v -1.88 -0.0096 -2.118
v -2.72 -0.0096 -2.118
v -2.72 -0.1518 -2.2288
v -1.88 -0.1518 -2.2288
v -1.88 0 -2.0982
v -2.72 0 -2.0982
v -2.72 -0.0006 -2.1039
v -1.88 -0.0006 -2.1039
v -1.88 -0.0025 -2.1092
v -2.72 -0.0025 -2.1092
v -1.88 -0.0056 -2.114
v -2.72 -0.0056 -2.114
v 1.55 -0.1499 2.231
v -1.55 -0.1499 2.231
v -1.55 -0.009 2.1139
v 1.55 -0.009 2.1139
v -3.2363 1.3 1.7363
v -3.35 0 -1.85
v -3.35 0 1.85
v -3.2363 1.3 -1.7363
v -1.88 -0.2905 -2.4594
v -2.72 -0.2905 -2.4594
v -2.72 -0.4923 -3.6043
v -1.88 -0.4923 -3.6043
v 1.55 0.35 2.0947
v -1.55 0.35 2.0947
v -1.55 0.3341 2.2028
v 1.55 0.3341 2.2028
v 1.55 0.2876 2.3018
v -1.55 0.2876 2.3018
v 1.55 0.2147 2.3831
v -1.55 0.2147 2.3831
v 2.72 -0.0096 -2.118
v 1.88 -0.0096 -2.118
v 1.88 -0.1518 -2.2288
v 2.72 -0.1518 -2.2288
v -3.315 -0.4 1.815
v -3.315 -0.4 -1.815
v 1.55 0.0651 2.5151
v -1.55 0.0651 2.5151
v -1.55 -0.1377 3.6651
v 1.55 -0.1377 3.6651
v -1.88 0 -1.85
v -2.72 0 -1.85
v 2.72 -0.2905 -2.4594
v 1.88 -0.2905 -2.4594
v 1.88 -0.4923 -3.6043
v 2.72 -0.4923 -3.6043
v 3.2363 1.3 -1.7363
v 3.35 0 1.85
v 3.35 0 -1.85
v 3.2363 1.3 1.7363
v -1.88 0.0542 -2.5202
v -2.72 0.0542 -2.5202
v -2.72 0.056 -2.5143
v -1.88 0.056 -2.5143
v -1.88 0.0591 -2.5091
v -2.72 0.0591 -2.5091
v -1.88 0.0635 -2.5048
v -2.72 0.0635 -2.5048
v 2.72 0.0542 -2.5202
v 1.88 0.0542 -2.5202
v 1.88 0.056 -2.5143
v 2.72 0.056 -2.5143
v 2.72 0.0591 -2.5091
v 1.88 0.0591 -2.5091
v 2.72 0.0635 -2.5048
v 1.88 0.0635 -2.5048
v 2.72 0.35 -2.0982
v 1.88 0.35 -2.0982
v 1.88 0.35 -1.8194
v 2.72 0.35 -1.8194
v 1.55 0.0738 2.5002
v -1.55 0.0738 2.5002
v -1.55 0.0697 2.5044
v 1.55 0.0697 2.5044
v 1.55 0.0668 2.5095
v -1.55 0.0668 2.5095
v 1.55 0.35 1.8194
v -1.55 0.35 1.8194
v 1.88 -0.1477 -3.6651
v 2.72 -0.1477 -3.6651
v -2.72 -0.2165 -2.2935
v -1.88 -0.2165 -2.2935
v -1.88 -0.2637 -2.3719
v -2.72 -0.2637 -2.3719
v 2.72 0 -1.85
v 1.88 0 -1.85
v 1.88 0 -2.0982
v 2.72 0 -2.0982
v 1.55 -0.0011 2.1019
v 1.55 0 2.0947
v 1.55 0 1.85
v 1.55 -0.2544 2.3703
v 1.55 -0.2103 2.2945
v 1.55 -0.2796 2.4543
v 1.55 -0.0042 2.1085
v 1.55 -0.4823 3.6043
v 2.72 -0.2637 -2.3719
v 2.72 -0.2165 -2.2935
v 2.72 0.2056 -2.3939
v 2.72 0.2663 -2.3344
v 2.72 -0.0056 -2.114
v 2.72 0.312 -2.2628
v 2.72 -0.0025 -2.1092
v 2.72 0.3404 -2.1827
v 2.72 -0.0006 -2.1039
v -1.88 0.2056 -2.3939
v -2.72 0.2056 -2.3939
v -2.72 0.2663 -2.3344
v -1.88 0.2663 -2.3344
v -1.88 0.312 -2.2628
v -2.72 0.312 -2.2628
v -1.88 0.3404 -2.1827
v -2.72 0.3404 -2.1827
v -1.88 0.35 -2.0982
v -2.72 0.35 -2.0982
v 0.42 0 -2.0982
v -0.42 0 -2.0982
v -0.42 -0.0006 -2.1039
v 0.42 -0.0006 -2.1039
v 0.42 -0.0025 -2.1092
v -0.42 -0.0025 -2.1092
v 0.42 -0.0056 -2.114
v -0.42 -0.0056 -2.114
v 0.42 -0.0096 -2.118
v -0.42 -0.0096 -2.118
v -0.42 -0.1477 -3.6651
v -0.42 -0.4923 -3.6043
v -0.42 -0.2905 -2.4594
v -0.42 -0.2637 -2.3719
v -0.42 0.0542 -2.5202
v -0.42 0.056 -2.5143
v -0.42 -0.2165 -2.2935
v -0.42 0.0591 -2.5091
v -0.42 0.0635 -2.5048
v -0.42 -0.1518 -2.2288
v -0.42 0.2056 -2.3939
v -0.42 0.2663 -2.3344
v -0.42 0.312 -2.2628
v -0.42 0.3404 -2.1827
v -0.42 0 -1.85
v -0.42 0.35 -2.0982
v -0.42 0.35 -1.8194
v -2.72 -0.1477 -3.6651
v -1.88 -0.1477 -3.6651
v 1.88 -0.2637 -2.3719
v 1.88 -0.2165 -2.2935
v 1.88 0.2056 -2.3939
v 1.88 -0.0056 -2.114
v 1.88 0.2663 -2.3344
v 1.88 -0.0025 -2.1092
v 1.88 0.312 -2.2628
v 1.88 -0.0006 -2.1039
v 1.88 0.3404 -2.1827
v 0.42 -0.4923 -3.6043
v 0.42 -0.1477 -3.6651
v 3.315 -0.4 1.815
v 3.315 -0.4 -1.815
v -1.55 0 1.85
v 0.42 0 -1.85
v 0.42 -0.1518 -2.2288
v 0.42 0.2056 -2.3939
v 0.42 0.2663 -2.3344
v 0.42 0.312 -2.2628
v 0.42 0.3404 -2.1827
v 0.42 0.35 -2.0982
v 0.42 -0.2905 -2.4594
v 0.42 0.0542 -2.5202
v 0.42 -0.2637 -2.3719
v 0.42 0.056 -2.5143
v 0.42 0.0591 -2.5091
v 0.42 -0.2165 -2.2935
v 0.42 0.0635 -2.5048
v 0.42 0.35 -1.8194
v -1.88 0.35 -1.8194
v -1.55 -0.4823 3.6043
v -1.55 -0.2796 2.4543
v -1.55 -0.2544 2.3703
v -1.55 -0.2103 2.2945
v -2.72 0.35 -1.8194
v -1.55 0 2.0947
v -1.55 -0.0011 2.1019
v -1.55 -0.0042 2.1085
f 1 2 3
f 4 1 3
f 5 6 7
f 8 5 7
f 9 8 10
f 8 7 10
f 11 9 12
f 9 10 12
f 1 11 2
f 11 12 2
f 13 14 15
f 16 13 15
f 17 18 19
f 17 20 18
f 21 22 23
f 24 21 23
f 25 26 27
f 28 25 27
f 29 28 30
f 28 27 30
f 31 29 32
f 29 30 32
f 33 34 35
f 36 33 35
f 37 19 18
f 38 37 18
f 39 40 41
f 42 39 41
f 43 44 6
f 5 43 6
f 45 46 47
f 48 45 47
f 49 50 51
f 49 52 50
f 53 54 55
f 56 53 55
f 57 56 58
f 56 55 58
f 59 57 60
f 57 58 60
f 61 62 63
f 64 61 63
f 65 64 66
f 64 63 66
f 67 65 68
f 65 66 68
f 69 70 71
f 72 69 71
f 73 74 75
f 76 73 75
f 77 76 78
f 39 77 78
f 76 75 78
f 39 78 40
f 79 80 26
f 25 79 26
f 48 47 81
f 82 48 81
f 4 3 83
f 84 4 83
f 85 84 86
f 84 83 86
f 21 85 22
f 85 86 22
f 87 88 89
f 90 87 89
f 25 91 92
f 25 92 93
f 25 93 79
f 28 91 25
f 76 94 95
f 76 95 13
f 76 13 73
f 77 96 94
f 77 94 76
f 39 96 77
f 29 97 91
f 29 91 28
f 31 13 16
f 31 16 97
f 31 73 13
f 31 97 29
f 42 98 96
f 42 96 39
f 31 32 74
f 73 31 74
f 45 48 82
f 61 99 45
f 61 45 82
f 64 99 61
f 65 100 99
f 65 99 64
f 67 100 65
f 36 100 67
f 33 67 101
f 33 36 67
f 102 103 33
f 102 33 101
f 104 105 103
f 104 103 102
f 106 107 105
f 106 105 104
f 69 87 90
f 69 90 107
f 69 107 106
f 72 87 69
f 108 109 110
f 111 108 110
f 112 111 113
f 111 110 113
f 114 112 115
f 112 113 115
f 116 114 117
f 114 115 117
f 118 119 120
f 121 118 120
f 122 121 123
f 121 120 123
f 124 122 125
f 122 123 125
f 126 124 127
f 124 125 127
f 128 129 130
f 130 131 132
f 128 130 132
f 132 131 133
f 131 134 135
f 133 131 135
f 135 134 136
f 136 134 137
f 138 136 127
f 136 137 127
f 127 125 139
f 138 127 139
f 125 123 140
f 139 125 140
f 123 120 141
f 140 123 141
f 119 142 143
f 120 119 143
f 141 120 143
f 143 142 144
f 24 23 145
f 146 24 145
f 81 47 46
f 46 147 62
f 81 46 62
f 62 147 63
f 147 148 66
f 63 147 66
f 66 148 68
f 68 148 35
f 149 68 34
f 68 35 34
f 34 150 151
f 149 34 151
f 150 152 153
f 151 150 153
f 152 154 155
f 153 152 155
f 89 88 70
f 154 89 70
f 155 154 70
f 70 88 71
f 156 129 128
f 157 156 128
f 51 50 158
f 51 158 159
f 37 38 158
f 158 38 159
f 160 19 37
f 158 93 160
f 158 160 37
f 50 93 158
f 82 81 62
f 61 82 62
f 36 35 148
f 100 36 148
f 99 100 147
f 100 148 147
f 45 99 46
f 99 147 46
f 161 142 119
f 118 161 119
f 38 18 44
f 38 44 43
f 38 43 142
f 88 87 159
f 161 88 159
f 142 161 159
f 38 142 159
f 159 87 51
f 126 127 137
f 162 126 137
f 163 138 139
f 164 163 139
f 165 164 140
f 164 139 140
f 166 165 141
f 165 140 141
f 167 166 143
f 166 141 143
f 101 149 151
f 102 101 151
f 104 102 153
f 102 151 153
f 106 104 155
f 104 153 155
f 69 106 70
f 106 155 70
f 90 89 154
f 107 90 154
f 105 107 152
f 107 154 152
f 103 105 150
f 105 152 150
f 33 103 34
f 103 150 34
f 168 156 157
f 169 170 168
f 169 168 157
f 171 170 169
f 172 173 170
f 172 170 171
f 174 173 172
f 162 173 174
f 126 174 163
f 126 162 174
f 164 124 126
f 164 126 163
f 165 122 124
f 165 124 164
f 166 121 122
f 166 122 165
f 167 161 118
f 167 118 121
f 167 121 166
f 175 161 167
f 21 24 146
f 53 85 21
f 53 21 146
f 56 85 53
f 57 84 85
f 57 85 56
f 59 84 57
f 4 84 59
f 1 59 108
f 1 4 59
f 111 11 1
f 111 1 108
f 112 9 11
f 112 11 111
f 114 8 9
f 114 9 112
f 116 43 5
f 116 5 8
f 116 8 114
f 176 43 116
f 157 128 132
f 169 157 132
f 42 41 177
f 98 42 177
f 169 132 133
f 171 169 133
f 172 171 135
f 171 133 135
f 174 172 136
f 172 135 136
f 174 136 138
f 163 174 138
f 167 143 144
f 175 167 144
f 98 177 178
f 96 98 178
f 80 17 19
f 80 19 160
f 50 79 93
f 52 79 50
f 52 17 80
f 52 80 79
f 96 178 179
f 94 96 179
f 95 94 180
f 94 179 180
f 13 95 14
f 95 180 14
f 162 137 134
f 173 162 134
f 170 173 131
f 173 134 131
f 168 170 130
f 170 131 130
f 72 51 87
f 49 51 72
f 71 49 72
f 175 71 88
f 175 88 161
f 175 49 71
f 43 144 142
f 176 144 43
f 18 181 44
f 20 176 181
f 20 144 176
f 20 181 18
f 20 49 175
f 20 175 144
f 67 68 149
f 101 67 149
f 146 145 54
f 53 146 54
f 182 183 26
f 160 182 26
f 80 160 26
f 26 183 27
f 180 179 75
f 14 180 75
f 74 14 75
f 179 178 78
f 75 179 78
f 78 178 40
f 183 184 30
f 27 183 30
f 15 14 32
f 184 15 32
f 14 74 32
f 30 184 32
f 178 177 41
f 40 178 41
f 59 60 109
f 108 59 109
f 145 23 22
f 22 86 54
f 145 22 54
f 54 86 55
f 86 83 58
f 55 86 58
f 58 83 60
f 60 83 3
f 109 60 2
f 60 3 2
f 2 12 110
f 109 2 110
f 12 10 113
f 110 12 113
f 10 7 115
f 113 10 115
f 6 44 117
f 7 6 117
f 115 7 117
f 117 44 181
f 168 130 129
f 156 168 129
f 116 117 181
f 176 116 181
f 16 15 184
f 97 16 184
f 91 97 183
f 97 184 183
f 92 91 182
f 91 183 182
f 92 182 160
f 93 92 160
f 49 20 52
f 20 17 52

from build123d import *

# Parameters (mm, degrees)
CROQUIS1_W              = 6.7
CROQUIS1_H              = 3.7
SALIENTE_EXTRUIR1_DEPTH = 1.3
SALIENTE_EXTRUIR1_TAPER = 5
CROQUIS1_2_W            = 6.7
CROQUIS1_2_H            = 3.7
SALIENTE_EXTRUIR2_DEPTH = 0.4
SALIENTE_EXTRUIR2_DRAFT = -5
BARRER1_START           = -0.42
BARRER1_DEPTH           = 0.84
MATRIZL1_COUNT          = 2
MATRIZL1_PITCH          = 2.3
MATRIZL2_COUNT          = 2
MATRIZL2_PITCH          = 2.3
BARRER2_START           = -1.55
BARRER2_DEPTH           = 3.1


# Read off the part's stored shape, not the designer's step: Barrer1, Barrer2
with BuildPart() as part:
    # Croquis1 → Saliente-Extruir1 (new body)
    with BuildSketch(Plane(origin=(0, 0, 0), x_dir=(1, 0, 0), z_dir=(0, 1, 0))):
        Rectangle(CROQUIS1_W, CROQUIS1_H)
    extrude(amount=SALIENTE_EXTRUIR1_DEPTH, taper=SALIENTE_EXTRUIR1_TAPER)


with BuildPart() as saliente_extruir2_tool:
    # Croquis1<2> → Saliente-Extruir2 (with draft: the straight prism first)
    with BuildSketch(Plane(origin=(0, 0, 0), x_dir=(1, 0, 0), z_dir=(0, 1, 0))):
        Rectangle(CROQUIS1_2_W, CROQUIS1_2_H)
    extrude(amount=-SALIENTE_EXTRUIR2_DEPTH)
    # Saliente-Extruir2: the draft: its side faces are tilted about the plane it starts from
    saliente_extruir2_sides = [saliente_extruir2_tool.faces().sort_by_distance(p)[0] for p in [
        (-3.35, -0.2, 0),
        (0, -0.2, 1.85),
        (3.35, -0.2, 0),
        (0, -0.2, -1.85),
    ]]
    draft(saliente_extruir2_sides, Plane(origin=(0, 0, 0), x_dir=(1, 0, 0), z_dir=(0, 1, 0)), SALIENTE_EXTRUIR2_DRAFT)


with BuildPart() as part_1:
    add(part.part)

    # Saliente-Extruir2: add saliente_extruir2_tool
    add(saliente_extruir2_tool.part)

    # Barrer1 outline → Barrer1 (add)
    with BuildSketch(Plane.YZ.offset(BARRER1_START)):
        with BuildLine():
            Line((0.35, -2.098236587), (0.35, -1.819378968))
            Line((0.35, -1.819378968), (0, -1.85))
            Line((0, -1.85), (0, -2.098236587))
            ThreePointArc((0, -2.098236587), (-0.002534971, -2.109205747), (-0.009625798, -2.117950387))
            Line((-0.009625798, -2.117950387), (-0.151773886, -2.228807417))
            ThreePointArc((-0.151773886, -2.228807417), (-0.24251362, -2.331233787), (-0.290463768, -2.459396356))
            Line((-0.290463768, -2.459396356), (-0.492341357, -3.604301053))
            Line((-0.492341357, -3.604301053), (-0.147658643, -3.665077915))
            Line((-0.147658643, -3.665077915), (0.054218945, -2.520173218))
            ThreePointArc((0.054218945, -2.520173218), (0.057415622, -2.511629047), (0.063464937, -2.504800622))
            Line((0.063464937, -2.504800622), (0.205613025, -2.393943592))
            ThreePointArc((0.205613025, -2.393943592), (0.311975433, -2.262773993), (0.35, -2.098236587))
        make_face()
    barrer1 = extrude(amount=BARRER1_DEPTH)

    # MatrizL1: Barrer1 ×2
    with Locations(*[(-i * MATRIZL1_PITCH, 0, 0) for i in range(1, MATRIZL1_COUNT)]):
        add(barrer1)

    # MatrizL2: Barrer1 ×2
    with Locations(*[(i * MATRIZL2_PITCH, 0, 0) for i in range(1, MATRIZL2_COUNT)]):
        add(barrer1)

    # Barrer2 outline → Barrer2 (add)
    with BuildSketch(Plane.YZ.offset(BARRER2_START)):
        with BuildLine():
            Line((0.35, 1.819378968), (0.35, 2.094689484))
            ThreePointArc((0.35, 2.094689484), (0.314483055, 2.253988747), (0.214659972, 2.383112954))
            Line((0.214659972, 2.383112954), (0.073760247, 2.500190888))
            ThreePointArc((0.073760247, 2.500190888), (0.068117087, 2.506867054), (0.065117385, 2.515077915))
            Line((0.065117385, 2.515077915), (-0.137658643, 3.665077915))
            Line((-0.137658643, 3.665077915), (-0.482341357, 3.604301053))
            Line((-0.482341357, 3.604301053), (-0.279565329, 2.454301053))
            ThreePointArc((-0.279565329, 2.454301053), (-0.234569796, 2.33113814), (-0.149922393, 2.23099565))
            Line((-0.149922393, 2.23099565), (-0.009022669, 2.113917715))
            ThreePointArc((-0.009022669, 2.113917715), (-0.002367796, 2.105309435), (0, 2.094689484))
            Line((0, 2.094689484), (0, 1.85))
            Line((0, 1.85), (0.35, 1.819378968))
        make_face()
    extrude(amount=BARRER2_DEPTH)


solid = part_1.part
